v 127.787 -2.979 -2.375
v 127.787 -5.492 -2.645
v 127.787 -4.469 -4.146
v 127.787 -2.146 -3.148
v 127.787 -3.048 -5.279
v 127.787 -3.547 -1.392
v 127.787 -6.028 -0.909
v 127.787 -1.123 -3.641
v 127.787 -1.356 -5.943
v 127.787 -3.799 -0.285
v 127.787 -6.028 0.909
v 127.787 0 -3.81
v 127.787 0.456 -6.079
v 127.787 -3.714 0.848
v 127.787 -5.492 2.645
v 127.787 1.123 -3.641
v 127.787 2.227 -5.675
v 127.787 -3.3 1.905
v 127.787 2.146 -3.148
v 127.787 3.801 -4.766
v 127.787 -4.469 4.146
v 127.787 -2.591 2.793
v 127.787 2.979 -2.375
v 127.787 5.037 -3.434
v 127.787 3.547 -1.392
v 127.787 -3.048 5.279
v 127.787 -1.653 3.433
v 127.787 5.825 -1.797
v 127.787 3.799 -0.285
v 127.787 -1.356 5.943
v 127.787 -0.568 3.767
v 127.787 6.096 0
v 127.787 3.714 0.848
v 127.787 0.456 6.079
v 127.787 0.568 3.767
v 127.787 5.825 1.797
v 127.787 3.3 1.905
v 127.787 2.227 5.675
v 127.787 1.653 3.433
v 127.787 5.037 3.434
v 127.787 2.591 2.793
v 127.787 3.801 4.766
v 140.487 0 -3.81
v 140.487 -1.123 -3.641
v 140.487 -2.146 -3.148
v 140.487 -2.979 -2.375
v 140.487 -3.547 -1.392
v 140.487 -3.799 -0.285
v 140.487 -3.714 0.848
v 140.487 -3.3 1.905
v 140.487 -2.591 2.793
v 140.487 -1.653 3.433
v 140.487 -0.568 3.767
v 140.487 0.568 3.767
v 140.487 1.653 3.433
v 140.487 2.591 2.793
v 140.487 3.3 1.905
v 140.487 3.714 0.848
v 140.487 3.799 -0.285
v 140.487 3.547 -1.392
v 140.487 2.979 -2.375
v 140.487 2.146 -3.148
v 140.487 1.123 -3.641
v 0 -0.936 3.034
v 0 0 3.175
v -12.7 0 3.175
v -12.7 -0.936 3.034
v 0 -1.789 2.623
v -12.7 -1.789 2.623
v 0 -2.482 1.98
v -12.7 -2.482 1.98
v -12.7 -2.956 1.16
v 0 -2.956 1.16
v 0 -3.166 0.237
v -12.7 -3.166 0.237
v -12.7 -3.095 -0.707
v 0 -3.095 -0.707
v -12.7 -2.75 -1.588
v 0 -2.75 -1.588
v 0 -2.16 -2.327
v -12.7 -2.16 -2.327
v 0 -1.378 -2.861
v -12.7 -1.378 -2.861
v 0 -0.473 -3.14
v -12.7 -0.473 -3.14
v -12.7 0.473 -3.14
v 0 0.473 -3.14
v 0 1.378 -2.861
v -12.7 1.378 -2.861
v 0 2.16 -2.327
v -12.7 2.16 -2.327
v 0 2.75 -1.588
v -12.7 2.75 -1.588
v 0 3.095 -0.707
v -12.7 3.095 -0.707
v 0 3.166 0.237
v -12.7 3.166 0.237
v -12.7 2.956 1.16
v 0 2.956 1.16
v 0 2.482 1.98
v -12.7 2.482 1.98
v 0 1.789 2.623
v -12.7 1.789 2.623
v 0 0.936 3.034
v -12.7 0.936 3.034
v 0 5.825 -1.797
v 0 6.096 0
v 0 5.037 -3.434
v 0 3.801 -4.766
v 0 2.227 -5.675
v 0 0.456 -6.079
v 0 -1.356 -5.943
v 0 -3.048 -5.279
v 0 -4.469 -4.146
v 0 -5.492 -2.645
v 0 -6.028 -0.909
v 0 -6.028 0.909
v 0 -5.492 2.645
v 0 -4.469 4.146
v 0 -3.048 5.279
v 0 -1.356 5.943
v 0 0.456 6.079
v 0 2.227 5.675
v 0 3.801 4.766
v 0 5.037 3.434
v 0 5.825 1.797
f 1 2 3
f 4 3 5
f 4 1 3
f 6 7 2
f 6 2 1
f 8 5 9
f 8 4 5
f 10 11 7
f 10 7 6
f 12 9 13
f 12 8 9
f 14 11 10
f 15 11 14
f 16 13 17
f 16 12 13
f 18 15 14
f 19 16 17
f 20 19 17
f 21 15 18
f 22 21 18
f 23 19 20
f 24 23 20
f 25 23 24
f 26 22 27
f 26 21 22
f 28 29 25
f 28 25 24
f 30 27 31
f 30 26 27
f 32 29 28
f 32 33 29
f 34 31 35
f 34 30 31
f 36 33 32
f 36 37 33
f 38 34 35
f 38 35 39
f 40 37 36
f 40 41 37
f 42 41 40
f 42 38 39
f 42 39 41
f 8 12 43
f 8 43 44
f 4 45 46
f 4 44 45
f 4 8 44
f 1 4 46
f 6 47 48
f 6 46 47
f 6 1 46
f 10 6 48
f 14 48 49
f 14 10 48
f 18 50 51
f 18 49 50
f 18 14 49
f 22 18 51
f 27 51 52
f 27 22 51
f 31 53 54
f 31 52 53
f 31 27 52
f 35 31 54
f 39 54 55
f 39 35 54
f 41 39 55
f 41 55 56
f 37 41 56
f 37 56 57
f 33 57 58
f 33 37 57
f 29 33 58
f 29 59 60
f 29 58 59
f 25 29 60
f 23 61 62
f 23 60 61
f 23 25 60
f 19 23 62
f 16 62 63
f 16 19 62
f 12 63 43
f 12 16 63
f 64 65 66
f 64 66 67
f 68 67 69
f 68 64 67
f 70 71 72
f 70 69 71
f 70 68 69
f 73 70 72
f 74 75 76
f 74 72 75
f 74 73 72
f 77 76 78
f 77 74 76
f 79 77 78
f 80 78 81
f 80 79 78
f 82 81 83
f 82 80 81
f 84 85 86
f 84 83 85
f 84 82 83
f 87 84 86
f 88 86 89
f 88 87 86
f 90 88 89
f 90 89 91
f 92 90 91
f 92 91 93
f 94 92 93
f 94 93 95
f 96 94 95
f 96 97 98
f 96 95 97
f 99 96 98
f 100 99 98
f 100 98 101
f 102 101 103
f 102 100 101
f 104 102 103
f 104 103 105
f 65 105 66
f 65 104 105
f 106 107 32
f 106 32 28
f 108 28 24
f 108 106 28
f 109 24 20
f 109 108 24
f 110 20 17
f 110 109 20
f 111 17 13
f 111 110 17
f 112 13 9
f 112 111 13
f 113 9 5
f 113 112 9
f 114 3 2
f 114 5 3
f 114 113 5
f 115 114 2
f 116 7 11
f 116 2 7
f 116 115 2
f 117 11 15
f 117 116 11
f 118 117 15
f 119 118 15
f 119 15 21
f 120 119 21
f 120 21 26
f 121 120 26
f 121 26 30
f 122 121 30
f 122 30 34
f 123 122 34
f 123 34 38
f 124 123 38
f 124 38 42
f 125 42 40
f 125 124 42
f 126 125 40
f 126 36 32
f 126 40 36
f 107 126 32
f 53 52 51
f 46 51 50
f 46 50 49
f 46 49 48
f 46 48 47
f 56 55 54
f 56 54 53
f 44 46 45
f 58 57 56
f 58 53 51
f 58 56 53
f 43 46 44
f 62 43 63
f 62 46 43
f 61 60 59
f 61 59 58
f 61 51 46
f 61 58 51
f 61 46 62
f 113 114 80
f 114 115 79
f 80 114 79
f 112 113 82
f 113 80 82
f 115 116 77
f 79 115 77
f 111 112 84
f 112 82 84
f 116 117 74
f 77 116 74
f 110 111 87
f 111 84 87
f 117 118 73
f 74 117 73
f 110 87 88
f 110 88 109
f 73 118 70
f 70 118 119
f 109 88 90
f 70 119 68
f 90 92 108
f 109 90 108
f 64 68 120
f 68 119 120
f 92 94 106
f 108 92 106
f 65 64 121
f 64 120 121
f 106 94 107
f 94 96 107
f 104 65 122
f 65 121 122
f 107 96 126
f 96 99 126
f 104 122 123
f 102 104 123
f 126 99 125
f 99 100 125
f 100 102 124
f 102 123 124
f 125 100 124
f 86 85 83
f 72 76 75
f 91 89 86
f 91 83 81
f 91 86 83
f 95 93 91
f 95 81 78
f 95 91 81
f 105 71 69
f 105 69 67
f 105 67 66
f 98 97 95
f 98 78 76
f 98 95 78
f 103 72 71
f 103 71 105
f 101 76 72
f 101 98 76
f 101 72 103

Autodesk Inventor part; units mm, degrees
ref_plane "YZ Plane" through (0, 0, 0) normal (1, 0, 0) x (0, 1, 0)
ref_plane "XZ Plane" through (0, 0, 0) normal (0, 1, 0) x (-1, 0, 0)
ref_plane "XY Plane" through (0, 0, 0) normal (0, 0, 1) x (1, 0, 0)
sketch "Sketch1" plane through (0, 0, 0) normal (1, 0, 0) x (0, 1, 0)
  circle A0 centre (0, 0) radius 6.096
  dimension "d0" = 12.192
extrude "Extrusion1" add sketch "Sketch1" along normal blind 127.7874
sketch "Sketch2" plane through (0, 0, 0) normal (-1, 0, 0) x (0, 0, 1)
  circle A0 centre (0, 0) radius 3.175
  circle A1 centre (0, 0) radius 3.175
  dimension "d3" = 6.35
extrude "Extrusion2" add sketch "Sketch2" along normal blind 12.7
sketch "Sketch3" plane through (127.7874, 0, 0) normal (1, 0, 0) x (0, 0, -1)
  circle A0 centre (0, 0) radius 3.81
  dimension "d6" = 7.62
extrude "Extrusion3" add sketch "Sketch3" along normal blind 12.7
properties part number "conveyor roller"
